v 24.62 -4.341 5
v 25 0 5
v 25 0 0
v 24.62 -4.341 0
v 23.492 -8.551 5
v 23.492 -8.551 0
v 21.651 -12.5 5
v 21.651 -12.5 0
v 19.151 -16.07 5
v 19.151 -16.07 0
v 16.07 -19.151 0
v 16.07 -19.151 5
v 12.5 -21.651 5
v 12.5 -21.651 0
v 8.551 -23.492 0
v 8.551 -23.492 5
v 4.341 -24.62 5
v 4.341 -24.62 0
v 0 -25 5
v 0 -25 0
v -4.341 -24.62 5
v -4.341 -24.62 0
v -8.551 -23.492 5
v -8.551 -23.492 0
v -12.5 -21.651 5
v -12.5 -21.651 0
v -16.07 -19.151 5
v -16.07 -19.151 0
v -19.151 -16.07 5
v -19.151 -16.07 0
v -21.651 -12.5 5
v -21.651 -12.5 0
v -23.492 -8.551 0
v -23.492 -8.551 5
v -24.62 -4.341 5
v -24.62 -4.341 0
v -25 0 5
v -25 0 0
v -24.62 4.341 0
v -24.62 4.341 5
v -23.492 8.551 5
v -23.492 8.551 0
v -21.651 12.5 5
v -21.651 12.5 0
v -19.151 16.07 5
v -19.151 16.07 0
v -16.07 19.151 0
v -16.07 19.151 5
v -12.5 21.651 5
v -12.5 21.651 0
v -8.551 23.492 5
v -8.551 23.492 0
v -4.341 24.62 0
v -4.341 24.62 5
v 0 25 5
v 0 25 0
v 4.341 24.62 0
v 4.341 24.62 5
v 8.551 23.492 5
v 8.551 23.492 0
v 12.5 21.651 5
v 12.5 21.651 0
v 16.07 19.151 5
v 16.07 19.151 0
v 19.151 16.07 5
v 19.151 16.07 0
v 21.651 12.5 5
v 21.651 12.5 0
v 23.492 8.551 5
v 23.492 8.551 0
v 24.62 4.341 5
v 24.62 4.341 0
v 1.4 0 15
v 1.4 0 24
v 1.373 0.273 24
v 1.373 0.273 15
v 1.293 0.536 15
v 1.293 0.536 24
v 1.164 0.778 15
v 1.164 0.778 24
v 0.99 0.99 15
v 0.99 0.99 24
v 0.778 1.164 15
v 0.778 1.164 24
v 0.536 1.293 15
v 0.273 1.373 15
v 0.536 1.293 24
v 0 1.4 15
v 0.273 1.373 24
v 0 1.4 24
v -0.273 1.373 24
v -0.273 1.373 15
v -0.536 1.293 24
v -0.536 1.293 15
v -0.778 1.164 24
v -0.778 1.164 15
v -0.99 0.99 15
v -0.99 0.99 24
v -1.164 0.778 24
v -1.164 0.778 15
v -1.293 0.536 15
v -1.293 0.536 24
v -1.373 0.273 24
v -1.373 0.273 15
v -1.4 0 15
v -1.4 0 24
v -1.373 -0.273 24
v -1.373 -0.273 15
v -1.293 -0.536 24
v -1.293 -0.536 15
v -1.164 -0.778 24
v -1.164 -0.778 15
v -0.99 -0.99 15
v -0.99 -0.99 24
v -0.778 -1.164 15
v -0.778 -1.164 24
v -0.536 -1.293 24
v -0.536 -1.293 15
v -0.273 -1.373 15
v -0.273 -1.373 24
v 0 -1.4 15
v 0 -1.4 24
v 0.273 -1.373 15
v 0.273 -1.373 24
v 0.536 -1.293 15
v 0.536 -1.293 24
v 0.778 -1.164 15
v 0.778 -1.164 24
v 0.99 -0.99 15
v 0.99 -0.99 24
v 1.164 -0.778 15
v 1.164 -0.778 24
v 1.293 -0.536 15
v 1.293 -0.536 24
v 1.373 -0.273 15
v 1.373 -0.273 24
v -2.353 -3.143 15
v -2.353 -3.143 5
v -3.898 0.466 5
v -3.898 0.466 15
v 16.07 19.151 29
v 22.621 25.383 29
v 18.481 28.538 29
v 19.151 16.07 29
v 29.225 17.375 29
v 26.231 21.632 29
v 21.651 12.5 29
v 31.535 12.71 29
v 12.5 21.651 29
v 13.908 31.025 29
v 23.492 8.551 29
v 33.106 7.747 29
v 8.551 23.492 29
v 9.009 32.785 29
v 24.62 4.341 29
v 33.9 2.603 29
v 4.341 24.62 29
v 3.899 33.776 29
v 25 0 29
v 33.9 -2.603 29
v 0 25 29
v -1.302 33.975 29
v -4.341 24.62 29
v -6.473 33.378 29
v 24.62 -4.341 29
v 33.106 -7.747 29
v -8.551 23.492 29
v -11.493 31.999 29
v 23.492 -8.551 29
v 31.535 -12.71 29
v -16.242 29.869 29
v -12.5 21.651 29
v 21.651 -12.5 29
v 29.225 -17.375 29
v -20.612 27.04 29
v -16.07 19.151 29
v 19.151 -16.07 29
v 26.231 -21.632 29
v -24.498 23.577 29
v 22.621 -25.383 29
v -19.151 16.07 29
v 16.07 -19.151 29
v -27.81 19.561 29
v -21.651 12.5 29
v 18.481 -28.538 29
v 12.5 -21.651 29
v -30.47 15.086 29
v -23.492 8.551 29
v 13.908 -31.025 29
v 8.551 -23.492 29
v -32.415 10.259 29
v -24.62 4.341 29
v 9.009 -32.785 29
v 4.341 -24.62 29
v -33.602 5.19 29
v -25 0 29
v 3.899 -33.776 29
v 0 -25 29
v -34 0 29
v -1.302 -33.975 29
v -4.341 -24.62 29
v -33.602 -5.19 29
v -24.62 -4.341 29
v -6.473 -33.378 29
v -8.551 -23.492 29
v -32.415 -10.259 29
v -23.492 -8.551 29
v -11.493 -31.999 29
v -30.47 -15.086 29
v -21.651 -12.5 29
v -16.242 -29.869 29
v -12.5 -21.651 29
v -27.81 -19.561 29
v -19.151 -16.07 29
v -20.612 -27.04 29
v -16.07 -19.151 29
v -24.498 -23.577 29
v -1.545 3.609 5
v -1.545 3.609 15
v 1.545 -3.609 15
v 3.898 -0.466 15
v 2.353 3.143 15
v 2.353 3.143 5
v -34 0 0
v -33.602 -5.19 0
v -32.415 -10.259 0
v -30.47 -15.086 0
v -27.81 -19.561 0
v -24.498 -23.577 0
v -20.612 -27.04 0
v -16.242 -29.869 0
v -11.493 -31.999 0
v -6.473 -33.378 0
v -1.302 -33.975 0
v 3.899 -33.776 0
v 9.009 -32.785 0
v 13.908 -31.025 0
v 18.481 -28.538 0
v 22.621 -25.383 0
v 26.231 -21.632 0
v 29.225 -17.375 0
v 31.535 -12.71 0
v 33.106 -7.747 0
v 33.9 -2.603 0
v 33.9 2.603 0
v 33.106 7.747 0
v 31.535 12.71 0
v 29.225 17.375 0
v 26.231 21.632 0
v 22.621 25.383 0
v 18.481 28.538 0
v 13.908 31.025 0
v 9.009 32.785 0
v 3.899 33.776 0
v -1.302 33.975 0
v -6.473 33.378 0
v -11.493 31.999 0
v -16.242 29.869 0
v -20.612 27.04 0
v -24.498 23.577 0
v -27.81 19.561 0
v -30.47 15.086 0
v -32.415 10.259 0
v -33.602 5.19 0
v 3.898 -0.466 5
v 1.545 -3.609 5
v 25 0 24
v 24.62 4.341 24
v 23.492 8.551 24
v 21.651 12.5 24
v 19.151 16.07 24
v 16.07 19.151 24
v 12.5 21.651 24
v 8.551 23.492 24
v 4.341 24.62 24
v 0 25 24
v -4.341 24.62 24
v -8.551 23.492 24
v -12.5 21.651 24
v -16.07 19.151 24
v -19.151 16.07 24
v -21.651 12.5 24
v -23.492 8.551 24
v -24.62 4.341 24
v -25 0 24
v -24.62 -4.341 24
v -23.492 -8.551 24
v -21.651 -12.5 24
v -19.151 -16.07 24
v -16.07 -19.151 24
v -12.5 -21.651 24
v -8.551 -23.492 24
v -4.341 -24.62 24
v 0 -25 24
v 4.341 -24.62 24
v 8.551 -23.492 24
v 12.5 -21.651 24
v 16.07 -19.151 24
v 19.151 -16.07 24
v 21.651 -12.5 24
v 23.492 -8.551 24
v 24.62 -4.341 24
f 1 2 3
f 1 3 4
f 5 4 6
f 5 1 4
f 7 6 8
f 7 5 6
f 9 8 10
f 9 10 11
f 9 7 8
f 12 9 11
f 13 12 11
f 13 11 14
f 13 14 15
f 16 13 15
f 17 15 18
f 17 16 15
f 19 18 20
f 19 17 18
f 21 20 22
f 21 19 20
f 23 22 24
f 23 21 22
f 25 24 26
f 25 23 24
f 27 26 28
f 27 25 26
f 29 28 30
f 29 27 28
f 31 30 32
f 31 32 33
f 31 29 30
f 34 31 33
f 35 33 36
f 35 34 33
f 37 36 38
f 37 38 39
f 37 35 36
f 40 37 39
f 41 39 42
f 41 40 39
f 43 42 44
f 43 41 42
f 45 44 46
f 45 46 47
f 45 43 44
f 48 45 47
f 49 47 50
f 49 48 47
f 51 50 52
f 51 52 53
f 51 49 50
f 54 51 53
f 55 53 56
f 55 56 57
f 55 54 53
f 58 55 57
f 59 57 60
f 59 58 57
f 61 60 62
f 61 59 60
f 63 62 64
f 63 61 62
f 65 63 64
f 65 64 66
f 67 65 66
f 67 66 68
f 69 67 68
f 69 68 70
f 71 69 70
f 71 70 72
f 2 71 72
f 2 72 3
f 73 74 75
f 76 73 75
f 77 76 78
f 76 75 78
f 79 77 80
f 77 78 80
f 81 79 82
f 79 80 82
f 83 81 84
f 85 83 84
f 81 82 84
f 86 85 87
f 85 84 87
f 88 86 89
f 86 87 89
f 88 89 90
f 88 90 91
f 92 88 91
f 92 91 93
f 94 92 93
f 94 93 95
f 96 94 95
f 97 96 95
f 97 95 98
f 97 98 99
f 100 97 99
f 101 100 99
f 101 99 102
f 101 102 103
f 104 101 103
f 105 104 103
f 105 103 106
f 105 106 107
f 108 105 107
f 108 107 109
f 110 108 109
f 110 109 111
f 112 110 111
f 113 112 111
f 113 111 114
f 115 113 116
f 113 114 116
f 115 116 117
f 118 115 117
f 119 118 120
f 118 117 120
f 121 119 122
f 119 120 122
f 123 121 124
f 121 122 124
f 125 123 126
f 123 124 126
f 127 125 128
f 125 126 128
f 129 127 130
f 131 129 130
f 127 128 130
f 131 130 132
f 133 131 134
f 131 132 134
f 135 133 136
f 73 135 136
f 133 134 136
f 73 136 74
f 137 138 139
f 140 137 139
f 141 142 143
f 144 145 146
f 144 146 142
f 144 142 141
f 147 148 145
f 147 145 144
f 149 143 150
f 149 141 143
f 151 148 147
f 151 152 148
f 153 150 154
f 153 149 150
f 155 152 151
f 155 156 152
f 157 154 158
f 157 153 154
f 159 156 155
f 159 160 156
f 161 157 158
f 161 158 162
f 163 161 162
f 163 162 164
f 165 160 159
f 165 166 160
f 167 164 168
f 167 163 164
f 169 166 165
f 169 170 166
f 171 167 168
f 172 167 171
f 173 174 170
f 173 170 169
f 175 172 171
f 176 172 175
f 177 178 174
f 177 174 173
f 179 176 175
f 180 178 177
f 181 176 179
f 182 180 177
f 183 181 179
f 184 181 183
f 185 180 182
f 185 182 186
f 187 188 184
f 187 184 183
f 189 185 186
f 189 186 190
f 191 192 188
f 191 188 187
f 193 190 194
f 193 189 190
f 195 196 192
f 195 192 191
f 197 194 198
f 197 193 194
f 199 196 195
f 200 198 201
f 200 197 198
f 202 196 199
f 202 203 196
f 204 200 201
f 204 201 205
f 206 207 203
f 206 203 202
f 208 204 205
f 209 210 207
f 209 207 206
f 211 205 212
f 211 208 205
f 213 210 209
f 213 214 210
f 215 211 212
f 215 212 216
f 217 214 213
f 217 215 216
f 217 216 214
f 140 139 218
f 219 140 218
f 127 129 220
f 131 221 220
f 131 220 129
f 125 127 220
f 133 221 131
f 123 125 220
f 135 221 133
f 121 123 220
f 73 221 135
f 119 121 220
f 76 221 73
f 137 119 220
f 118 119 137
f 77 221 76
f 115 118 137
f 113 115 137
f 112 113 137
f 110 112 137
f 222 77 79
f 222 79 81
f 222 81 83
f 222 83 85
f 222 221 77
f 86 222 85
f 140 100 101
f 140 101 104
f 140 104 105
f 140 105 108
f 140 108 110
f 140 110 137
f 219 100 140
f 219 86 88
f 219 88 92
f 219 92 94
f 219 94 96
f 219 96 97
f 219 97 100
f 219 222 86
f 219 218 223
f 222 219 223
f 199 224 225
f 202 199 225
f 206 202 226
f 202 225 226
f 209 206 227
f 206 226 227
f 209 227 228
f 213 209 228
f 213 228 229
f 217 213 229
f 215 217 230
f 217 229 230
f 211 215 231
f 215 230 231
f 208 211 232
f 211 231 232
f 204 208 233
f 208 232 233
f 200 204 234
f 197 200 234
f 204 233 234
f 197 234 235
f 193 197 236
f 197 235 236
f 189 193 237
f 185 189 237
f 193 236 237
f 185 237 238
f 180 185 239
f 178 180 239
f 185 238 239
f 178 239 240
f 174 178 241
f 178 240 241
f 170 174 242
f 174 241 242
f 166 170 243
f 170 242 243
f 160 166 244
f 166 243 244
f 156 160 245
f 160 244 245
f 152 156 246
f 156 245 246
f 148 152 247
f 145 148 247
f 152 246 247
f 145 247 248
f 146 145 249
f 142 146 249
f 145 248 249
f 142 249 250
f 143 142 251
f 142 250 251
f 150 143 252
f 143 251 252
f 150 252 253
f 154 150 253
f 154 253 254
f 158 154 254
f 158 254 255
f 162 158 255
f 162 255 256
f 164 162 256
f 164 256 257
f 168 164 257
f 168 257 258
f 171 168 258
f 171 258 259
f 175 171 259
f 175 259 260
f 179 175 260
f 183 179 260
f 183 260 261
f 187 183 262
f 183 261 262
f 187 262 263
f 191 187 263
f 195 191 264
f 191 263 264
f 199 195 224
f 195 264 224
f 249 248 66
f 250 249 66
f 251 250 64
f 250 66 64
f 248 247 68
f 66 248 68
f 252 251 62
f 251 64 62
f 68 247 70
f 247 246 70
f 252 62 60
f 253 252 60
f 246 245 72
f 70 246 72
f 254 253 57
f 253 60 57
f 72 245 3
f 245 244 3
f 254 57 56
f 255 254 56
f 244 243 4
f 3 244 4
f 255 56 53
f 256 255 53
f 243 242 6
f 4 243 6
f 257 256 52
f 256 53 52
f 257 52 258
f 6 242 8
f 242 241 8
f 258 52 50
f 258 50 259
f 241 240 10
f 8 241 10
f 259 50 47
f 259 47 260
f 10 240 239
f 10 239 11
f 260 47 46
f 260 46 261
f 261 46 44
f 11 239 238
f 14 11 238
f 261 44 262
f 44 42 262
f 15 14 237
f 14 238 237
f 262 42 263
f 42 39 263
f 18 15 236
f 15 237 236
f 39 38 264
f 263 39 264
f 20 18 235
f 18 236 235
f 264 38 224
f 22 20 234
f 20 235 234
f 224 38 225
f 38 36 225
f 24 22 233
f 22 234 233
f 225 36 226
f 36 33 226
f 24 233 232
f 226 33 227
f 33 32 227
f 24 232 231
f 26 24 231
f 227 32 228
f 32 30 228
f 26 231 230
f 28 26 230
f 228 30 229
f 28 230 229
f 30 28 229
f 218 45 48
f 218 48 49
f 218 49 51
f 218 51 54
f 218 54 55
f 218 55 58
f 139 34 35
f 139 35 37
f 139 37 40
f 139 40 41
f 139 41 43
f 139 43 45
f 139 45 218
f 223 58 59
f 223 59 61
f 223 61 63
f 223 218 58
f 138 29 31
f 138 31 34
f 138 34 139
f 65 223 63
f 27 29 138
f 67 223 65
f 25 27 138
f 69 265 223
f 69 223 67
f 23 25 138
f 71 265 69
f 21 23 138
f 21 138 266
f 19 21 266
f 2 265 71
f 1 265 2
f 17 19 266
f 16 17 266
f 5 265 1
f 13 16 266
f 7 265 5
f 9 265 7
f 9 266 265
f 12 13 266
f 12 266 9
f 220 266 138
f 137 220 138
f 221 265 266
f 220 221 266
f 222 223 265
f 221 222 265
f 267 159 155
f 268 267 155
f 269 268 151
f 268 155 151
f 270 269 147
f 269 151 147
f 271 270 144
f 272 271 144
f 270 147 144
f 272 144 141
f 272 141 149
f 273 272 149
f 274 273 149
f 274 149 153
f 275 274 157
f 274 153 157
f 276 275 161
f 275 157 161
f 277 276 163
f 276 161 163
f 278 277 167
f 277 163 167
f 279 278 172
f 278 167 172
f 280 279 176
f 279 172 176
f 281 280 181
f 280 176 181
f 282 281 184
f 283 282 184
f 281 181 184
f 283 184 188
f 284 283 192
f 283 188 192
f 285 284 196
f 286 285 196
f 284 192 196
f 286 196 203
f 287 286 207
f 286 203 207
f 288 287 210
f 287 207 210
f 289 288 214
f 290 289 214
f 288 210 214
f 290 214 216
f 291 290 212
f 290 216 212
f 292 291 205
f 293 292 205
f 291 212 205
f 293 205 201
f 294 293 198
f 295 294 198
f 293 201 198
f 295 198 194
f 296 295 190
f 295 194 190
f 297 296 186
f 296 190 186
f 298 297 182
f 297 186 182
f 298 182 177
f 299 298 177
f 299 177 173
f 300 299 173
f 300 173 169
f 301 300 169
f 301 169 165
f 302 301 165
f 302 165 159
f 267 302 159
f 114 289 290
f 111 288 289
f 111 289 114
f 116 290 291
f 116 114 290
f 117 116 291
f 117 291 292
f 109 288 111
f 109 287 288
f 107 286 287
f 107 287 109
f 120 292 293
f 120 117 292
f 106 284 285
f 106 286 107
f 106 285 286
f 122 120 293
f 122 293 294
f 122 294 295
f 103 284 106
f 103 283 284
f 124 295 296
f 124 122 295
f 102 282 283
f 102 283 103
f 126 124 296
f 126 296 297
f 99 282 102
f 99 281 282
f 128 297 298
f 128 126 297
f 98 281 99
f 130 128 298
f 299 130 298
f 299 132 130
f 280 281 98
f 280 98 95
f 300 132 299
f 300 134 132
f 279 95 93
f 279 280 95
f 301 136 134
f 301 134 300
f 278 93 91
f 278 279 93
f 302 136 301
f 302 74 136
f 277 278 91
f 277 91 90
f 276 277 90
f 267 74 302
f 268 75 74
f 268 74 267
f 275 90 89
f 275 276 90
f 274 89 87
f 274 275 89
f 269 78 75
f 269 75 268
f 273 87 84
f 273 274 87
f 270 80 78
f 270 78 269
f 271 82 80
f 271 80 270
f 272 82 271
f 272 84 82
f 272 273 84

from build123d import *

# Parameters (mm, degrees)
SKETCH_1_R          = 34
EXTRUDE_1_DEPTH     = 29
SKETCH_2_R          = 25
CUT_EXTRUDE_1_DEPTH = 5
CUT_EXTRUDE_START   = -5
SKETCH_3_R          = 25
CUT_EXTRUDE_2_DEPTH = 5
CUT_EXTRUDE_3_DEPTH = 10
SKETCH_5_R          = 1.4
CUT_EXTRUDE_4_DEPTH = 54.74011537


with BuildPart() as part:
    # 草图1 → 凸台-拉伸1 (new body)
    with BuildSketch(Plane.XY):
        with Locations(Location((0, 0, 0), (0, 0, 180))):
            Circle(SKETCH_1_R)
    extrude(amount=EXTRUDE_1_DEPTH)

    # 草图2 → 切除-拉伸1 (cut)
    with BuildSketch(Plane.XY.offset(29)):
        Circle(SKETCH_2_R)
    extrude(amount=-CUT_EXTRUDE_1_DEPTH, mode=Mode.SUBTRACT)

    # 草图3 → 切除-拉伸2 (cut)
    with BuildSketch(Plane(origin=(0, 0, 0), x_dir=(-1, 0, 0), z_dir=(0, 0, -1)).offset(CUT_EXTRUDE_START)):
        with Locations(Location((0, 0, 0), (0, 0, 180))):
            Circle(SKETCH_3_R)
    extrude(amount=CUT_EXTRUDE_2_DEPTH, mode=Mode.SUBTRACT)

    # 草图4 → 切除-拉伸3 (cut)
    with BuildSketch(Plane(origin=(0, 0, 5), x_dir=(-1, 0, 0), z_dir=(0, 0, -1))):
        Polygon((2.352778868, -3.142891174), (3.898213032, 0.466120682), (1.545434164, 3.609011856), (-2.352778868, 3.142891174), (-3.898213032, -0.466120682), (-1.545434164, -3.609011856), align=None)
    extrude(amount=-CUT_EXTRUDE_3_DEPTH, mode=Mode.SUBTRACT)

    # 草图5 → 切除-拉伸4 (cut, through all)
    with BuildSketch(Plane.XY.offset(24)):
        Circle(SKETCH_5_R)
    extrude(amount=-CUT_EXTRUDE_4_DEPTH, mode=Mode.SUBTRACT)


solid = part.part
